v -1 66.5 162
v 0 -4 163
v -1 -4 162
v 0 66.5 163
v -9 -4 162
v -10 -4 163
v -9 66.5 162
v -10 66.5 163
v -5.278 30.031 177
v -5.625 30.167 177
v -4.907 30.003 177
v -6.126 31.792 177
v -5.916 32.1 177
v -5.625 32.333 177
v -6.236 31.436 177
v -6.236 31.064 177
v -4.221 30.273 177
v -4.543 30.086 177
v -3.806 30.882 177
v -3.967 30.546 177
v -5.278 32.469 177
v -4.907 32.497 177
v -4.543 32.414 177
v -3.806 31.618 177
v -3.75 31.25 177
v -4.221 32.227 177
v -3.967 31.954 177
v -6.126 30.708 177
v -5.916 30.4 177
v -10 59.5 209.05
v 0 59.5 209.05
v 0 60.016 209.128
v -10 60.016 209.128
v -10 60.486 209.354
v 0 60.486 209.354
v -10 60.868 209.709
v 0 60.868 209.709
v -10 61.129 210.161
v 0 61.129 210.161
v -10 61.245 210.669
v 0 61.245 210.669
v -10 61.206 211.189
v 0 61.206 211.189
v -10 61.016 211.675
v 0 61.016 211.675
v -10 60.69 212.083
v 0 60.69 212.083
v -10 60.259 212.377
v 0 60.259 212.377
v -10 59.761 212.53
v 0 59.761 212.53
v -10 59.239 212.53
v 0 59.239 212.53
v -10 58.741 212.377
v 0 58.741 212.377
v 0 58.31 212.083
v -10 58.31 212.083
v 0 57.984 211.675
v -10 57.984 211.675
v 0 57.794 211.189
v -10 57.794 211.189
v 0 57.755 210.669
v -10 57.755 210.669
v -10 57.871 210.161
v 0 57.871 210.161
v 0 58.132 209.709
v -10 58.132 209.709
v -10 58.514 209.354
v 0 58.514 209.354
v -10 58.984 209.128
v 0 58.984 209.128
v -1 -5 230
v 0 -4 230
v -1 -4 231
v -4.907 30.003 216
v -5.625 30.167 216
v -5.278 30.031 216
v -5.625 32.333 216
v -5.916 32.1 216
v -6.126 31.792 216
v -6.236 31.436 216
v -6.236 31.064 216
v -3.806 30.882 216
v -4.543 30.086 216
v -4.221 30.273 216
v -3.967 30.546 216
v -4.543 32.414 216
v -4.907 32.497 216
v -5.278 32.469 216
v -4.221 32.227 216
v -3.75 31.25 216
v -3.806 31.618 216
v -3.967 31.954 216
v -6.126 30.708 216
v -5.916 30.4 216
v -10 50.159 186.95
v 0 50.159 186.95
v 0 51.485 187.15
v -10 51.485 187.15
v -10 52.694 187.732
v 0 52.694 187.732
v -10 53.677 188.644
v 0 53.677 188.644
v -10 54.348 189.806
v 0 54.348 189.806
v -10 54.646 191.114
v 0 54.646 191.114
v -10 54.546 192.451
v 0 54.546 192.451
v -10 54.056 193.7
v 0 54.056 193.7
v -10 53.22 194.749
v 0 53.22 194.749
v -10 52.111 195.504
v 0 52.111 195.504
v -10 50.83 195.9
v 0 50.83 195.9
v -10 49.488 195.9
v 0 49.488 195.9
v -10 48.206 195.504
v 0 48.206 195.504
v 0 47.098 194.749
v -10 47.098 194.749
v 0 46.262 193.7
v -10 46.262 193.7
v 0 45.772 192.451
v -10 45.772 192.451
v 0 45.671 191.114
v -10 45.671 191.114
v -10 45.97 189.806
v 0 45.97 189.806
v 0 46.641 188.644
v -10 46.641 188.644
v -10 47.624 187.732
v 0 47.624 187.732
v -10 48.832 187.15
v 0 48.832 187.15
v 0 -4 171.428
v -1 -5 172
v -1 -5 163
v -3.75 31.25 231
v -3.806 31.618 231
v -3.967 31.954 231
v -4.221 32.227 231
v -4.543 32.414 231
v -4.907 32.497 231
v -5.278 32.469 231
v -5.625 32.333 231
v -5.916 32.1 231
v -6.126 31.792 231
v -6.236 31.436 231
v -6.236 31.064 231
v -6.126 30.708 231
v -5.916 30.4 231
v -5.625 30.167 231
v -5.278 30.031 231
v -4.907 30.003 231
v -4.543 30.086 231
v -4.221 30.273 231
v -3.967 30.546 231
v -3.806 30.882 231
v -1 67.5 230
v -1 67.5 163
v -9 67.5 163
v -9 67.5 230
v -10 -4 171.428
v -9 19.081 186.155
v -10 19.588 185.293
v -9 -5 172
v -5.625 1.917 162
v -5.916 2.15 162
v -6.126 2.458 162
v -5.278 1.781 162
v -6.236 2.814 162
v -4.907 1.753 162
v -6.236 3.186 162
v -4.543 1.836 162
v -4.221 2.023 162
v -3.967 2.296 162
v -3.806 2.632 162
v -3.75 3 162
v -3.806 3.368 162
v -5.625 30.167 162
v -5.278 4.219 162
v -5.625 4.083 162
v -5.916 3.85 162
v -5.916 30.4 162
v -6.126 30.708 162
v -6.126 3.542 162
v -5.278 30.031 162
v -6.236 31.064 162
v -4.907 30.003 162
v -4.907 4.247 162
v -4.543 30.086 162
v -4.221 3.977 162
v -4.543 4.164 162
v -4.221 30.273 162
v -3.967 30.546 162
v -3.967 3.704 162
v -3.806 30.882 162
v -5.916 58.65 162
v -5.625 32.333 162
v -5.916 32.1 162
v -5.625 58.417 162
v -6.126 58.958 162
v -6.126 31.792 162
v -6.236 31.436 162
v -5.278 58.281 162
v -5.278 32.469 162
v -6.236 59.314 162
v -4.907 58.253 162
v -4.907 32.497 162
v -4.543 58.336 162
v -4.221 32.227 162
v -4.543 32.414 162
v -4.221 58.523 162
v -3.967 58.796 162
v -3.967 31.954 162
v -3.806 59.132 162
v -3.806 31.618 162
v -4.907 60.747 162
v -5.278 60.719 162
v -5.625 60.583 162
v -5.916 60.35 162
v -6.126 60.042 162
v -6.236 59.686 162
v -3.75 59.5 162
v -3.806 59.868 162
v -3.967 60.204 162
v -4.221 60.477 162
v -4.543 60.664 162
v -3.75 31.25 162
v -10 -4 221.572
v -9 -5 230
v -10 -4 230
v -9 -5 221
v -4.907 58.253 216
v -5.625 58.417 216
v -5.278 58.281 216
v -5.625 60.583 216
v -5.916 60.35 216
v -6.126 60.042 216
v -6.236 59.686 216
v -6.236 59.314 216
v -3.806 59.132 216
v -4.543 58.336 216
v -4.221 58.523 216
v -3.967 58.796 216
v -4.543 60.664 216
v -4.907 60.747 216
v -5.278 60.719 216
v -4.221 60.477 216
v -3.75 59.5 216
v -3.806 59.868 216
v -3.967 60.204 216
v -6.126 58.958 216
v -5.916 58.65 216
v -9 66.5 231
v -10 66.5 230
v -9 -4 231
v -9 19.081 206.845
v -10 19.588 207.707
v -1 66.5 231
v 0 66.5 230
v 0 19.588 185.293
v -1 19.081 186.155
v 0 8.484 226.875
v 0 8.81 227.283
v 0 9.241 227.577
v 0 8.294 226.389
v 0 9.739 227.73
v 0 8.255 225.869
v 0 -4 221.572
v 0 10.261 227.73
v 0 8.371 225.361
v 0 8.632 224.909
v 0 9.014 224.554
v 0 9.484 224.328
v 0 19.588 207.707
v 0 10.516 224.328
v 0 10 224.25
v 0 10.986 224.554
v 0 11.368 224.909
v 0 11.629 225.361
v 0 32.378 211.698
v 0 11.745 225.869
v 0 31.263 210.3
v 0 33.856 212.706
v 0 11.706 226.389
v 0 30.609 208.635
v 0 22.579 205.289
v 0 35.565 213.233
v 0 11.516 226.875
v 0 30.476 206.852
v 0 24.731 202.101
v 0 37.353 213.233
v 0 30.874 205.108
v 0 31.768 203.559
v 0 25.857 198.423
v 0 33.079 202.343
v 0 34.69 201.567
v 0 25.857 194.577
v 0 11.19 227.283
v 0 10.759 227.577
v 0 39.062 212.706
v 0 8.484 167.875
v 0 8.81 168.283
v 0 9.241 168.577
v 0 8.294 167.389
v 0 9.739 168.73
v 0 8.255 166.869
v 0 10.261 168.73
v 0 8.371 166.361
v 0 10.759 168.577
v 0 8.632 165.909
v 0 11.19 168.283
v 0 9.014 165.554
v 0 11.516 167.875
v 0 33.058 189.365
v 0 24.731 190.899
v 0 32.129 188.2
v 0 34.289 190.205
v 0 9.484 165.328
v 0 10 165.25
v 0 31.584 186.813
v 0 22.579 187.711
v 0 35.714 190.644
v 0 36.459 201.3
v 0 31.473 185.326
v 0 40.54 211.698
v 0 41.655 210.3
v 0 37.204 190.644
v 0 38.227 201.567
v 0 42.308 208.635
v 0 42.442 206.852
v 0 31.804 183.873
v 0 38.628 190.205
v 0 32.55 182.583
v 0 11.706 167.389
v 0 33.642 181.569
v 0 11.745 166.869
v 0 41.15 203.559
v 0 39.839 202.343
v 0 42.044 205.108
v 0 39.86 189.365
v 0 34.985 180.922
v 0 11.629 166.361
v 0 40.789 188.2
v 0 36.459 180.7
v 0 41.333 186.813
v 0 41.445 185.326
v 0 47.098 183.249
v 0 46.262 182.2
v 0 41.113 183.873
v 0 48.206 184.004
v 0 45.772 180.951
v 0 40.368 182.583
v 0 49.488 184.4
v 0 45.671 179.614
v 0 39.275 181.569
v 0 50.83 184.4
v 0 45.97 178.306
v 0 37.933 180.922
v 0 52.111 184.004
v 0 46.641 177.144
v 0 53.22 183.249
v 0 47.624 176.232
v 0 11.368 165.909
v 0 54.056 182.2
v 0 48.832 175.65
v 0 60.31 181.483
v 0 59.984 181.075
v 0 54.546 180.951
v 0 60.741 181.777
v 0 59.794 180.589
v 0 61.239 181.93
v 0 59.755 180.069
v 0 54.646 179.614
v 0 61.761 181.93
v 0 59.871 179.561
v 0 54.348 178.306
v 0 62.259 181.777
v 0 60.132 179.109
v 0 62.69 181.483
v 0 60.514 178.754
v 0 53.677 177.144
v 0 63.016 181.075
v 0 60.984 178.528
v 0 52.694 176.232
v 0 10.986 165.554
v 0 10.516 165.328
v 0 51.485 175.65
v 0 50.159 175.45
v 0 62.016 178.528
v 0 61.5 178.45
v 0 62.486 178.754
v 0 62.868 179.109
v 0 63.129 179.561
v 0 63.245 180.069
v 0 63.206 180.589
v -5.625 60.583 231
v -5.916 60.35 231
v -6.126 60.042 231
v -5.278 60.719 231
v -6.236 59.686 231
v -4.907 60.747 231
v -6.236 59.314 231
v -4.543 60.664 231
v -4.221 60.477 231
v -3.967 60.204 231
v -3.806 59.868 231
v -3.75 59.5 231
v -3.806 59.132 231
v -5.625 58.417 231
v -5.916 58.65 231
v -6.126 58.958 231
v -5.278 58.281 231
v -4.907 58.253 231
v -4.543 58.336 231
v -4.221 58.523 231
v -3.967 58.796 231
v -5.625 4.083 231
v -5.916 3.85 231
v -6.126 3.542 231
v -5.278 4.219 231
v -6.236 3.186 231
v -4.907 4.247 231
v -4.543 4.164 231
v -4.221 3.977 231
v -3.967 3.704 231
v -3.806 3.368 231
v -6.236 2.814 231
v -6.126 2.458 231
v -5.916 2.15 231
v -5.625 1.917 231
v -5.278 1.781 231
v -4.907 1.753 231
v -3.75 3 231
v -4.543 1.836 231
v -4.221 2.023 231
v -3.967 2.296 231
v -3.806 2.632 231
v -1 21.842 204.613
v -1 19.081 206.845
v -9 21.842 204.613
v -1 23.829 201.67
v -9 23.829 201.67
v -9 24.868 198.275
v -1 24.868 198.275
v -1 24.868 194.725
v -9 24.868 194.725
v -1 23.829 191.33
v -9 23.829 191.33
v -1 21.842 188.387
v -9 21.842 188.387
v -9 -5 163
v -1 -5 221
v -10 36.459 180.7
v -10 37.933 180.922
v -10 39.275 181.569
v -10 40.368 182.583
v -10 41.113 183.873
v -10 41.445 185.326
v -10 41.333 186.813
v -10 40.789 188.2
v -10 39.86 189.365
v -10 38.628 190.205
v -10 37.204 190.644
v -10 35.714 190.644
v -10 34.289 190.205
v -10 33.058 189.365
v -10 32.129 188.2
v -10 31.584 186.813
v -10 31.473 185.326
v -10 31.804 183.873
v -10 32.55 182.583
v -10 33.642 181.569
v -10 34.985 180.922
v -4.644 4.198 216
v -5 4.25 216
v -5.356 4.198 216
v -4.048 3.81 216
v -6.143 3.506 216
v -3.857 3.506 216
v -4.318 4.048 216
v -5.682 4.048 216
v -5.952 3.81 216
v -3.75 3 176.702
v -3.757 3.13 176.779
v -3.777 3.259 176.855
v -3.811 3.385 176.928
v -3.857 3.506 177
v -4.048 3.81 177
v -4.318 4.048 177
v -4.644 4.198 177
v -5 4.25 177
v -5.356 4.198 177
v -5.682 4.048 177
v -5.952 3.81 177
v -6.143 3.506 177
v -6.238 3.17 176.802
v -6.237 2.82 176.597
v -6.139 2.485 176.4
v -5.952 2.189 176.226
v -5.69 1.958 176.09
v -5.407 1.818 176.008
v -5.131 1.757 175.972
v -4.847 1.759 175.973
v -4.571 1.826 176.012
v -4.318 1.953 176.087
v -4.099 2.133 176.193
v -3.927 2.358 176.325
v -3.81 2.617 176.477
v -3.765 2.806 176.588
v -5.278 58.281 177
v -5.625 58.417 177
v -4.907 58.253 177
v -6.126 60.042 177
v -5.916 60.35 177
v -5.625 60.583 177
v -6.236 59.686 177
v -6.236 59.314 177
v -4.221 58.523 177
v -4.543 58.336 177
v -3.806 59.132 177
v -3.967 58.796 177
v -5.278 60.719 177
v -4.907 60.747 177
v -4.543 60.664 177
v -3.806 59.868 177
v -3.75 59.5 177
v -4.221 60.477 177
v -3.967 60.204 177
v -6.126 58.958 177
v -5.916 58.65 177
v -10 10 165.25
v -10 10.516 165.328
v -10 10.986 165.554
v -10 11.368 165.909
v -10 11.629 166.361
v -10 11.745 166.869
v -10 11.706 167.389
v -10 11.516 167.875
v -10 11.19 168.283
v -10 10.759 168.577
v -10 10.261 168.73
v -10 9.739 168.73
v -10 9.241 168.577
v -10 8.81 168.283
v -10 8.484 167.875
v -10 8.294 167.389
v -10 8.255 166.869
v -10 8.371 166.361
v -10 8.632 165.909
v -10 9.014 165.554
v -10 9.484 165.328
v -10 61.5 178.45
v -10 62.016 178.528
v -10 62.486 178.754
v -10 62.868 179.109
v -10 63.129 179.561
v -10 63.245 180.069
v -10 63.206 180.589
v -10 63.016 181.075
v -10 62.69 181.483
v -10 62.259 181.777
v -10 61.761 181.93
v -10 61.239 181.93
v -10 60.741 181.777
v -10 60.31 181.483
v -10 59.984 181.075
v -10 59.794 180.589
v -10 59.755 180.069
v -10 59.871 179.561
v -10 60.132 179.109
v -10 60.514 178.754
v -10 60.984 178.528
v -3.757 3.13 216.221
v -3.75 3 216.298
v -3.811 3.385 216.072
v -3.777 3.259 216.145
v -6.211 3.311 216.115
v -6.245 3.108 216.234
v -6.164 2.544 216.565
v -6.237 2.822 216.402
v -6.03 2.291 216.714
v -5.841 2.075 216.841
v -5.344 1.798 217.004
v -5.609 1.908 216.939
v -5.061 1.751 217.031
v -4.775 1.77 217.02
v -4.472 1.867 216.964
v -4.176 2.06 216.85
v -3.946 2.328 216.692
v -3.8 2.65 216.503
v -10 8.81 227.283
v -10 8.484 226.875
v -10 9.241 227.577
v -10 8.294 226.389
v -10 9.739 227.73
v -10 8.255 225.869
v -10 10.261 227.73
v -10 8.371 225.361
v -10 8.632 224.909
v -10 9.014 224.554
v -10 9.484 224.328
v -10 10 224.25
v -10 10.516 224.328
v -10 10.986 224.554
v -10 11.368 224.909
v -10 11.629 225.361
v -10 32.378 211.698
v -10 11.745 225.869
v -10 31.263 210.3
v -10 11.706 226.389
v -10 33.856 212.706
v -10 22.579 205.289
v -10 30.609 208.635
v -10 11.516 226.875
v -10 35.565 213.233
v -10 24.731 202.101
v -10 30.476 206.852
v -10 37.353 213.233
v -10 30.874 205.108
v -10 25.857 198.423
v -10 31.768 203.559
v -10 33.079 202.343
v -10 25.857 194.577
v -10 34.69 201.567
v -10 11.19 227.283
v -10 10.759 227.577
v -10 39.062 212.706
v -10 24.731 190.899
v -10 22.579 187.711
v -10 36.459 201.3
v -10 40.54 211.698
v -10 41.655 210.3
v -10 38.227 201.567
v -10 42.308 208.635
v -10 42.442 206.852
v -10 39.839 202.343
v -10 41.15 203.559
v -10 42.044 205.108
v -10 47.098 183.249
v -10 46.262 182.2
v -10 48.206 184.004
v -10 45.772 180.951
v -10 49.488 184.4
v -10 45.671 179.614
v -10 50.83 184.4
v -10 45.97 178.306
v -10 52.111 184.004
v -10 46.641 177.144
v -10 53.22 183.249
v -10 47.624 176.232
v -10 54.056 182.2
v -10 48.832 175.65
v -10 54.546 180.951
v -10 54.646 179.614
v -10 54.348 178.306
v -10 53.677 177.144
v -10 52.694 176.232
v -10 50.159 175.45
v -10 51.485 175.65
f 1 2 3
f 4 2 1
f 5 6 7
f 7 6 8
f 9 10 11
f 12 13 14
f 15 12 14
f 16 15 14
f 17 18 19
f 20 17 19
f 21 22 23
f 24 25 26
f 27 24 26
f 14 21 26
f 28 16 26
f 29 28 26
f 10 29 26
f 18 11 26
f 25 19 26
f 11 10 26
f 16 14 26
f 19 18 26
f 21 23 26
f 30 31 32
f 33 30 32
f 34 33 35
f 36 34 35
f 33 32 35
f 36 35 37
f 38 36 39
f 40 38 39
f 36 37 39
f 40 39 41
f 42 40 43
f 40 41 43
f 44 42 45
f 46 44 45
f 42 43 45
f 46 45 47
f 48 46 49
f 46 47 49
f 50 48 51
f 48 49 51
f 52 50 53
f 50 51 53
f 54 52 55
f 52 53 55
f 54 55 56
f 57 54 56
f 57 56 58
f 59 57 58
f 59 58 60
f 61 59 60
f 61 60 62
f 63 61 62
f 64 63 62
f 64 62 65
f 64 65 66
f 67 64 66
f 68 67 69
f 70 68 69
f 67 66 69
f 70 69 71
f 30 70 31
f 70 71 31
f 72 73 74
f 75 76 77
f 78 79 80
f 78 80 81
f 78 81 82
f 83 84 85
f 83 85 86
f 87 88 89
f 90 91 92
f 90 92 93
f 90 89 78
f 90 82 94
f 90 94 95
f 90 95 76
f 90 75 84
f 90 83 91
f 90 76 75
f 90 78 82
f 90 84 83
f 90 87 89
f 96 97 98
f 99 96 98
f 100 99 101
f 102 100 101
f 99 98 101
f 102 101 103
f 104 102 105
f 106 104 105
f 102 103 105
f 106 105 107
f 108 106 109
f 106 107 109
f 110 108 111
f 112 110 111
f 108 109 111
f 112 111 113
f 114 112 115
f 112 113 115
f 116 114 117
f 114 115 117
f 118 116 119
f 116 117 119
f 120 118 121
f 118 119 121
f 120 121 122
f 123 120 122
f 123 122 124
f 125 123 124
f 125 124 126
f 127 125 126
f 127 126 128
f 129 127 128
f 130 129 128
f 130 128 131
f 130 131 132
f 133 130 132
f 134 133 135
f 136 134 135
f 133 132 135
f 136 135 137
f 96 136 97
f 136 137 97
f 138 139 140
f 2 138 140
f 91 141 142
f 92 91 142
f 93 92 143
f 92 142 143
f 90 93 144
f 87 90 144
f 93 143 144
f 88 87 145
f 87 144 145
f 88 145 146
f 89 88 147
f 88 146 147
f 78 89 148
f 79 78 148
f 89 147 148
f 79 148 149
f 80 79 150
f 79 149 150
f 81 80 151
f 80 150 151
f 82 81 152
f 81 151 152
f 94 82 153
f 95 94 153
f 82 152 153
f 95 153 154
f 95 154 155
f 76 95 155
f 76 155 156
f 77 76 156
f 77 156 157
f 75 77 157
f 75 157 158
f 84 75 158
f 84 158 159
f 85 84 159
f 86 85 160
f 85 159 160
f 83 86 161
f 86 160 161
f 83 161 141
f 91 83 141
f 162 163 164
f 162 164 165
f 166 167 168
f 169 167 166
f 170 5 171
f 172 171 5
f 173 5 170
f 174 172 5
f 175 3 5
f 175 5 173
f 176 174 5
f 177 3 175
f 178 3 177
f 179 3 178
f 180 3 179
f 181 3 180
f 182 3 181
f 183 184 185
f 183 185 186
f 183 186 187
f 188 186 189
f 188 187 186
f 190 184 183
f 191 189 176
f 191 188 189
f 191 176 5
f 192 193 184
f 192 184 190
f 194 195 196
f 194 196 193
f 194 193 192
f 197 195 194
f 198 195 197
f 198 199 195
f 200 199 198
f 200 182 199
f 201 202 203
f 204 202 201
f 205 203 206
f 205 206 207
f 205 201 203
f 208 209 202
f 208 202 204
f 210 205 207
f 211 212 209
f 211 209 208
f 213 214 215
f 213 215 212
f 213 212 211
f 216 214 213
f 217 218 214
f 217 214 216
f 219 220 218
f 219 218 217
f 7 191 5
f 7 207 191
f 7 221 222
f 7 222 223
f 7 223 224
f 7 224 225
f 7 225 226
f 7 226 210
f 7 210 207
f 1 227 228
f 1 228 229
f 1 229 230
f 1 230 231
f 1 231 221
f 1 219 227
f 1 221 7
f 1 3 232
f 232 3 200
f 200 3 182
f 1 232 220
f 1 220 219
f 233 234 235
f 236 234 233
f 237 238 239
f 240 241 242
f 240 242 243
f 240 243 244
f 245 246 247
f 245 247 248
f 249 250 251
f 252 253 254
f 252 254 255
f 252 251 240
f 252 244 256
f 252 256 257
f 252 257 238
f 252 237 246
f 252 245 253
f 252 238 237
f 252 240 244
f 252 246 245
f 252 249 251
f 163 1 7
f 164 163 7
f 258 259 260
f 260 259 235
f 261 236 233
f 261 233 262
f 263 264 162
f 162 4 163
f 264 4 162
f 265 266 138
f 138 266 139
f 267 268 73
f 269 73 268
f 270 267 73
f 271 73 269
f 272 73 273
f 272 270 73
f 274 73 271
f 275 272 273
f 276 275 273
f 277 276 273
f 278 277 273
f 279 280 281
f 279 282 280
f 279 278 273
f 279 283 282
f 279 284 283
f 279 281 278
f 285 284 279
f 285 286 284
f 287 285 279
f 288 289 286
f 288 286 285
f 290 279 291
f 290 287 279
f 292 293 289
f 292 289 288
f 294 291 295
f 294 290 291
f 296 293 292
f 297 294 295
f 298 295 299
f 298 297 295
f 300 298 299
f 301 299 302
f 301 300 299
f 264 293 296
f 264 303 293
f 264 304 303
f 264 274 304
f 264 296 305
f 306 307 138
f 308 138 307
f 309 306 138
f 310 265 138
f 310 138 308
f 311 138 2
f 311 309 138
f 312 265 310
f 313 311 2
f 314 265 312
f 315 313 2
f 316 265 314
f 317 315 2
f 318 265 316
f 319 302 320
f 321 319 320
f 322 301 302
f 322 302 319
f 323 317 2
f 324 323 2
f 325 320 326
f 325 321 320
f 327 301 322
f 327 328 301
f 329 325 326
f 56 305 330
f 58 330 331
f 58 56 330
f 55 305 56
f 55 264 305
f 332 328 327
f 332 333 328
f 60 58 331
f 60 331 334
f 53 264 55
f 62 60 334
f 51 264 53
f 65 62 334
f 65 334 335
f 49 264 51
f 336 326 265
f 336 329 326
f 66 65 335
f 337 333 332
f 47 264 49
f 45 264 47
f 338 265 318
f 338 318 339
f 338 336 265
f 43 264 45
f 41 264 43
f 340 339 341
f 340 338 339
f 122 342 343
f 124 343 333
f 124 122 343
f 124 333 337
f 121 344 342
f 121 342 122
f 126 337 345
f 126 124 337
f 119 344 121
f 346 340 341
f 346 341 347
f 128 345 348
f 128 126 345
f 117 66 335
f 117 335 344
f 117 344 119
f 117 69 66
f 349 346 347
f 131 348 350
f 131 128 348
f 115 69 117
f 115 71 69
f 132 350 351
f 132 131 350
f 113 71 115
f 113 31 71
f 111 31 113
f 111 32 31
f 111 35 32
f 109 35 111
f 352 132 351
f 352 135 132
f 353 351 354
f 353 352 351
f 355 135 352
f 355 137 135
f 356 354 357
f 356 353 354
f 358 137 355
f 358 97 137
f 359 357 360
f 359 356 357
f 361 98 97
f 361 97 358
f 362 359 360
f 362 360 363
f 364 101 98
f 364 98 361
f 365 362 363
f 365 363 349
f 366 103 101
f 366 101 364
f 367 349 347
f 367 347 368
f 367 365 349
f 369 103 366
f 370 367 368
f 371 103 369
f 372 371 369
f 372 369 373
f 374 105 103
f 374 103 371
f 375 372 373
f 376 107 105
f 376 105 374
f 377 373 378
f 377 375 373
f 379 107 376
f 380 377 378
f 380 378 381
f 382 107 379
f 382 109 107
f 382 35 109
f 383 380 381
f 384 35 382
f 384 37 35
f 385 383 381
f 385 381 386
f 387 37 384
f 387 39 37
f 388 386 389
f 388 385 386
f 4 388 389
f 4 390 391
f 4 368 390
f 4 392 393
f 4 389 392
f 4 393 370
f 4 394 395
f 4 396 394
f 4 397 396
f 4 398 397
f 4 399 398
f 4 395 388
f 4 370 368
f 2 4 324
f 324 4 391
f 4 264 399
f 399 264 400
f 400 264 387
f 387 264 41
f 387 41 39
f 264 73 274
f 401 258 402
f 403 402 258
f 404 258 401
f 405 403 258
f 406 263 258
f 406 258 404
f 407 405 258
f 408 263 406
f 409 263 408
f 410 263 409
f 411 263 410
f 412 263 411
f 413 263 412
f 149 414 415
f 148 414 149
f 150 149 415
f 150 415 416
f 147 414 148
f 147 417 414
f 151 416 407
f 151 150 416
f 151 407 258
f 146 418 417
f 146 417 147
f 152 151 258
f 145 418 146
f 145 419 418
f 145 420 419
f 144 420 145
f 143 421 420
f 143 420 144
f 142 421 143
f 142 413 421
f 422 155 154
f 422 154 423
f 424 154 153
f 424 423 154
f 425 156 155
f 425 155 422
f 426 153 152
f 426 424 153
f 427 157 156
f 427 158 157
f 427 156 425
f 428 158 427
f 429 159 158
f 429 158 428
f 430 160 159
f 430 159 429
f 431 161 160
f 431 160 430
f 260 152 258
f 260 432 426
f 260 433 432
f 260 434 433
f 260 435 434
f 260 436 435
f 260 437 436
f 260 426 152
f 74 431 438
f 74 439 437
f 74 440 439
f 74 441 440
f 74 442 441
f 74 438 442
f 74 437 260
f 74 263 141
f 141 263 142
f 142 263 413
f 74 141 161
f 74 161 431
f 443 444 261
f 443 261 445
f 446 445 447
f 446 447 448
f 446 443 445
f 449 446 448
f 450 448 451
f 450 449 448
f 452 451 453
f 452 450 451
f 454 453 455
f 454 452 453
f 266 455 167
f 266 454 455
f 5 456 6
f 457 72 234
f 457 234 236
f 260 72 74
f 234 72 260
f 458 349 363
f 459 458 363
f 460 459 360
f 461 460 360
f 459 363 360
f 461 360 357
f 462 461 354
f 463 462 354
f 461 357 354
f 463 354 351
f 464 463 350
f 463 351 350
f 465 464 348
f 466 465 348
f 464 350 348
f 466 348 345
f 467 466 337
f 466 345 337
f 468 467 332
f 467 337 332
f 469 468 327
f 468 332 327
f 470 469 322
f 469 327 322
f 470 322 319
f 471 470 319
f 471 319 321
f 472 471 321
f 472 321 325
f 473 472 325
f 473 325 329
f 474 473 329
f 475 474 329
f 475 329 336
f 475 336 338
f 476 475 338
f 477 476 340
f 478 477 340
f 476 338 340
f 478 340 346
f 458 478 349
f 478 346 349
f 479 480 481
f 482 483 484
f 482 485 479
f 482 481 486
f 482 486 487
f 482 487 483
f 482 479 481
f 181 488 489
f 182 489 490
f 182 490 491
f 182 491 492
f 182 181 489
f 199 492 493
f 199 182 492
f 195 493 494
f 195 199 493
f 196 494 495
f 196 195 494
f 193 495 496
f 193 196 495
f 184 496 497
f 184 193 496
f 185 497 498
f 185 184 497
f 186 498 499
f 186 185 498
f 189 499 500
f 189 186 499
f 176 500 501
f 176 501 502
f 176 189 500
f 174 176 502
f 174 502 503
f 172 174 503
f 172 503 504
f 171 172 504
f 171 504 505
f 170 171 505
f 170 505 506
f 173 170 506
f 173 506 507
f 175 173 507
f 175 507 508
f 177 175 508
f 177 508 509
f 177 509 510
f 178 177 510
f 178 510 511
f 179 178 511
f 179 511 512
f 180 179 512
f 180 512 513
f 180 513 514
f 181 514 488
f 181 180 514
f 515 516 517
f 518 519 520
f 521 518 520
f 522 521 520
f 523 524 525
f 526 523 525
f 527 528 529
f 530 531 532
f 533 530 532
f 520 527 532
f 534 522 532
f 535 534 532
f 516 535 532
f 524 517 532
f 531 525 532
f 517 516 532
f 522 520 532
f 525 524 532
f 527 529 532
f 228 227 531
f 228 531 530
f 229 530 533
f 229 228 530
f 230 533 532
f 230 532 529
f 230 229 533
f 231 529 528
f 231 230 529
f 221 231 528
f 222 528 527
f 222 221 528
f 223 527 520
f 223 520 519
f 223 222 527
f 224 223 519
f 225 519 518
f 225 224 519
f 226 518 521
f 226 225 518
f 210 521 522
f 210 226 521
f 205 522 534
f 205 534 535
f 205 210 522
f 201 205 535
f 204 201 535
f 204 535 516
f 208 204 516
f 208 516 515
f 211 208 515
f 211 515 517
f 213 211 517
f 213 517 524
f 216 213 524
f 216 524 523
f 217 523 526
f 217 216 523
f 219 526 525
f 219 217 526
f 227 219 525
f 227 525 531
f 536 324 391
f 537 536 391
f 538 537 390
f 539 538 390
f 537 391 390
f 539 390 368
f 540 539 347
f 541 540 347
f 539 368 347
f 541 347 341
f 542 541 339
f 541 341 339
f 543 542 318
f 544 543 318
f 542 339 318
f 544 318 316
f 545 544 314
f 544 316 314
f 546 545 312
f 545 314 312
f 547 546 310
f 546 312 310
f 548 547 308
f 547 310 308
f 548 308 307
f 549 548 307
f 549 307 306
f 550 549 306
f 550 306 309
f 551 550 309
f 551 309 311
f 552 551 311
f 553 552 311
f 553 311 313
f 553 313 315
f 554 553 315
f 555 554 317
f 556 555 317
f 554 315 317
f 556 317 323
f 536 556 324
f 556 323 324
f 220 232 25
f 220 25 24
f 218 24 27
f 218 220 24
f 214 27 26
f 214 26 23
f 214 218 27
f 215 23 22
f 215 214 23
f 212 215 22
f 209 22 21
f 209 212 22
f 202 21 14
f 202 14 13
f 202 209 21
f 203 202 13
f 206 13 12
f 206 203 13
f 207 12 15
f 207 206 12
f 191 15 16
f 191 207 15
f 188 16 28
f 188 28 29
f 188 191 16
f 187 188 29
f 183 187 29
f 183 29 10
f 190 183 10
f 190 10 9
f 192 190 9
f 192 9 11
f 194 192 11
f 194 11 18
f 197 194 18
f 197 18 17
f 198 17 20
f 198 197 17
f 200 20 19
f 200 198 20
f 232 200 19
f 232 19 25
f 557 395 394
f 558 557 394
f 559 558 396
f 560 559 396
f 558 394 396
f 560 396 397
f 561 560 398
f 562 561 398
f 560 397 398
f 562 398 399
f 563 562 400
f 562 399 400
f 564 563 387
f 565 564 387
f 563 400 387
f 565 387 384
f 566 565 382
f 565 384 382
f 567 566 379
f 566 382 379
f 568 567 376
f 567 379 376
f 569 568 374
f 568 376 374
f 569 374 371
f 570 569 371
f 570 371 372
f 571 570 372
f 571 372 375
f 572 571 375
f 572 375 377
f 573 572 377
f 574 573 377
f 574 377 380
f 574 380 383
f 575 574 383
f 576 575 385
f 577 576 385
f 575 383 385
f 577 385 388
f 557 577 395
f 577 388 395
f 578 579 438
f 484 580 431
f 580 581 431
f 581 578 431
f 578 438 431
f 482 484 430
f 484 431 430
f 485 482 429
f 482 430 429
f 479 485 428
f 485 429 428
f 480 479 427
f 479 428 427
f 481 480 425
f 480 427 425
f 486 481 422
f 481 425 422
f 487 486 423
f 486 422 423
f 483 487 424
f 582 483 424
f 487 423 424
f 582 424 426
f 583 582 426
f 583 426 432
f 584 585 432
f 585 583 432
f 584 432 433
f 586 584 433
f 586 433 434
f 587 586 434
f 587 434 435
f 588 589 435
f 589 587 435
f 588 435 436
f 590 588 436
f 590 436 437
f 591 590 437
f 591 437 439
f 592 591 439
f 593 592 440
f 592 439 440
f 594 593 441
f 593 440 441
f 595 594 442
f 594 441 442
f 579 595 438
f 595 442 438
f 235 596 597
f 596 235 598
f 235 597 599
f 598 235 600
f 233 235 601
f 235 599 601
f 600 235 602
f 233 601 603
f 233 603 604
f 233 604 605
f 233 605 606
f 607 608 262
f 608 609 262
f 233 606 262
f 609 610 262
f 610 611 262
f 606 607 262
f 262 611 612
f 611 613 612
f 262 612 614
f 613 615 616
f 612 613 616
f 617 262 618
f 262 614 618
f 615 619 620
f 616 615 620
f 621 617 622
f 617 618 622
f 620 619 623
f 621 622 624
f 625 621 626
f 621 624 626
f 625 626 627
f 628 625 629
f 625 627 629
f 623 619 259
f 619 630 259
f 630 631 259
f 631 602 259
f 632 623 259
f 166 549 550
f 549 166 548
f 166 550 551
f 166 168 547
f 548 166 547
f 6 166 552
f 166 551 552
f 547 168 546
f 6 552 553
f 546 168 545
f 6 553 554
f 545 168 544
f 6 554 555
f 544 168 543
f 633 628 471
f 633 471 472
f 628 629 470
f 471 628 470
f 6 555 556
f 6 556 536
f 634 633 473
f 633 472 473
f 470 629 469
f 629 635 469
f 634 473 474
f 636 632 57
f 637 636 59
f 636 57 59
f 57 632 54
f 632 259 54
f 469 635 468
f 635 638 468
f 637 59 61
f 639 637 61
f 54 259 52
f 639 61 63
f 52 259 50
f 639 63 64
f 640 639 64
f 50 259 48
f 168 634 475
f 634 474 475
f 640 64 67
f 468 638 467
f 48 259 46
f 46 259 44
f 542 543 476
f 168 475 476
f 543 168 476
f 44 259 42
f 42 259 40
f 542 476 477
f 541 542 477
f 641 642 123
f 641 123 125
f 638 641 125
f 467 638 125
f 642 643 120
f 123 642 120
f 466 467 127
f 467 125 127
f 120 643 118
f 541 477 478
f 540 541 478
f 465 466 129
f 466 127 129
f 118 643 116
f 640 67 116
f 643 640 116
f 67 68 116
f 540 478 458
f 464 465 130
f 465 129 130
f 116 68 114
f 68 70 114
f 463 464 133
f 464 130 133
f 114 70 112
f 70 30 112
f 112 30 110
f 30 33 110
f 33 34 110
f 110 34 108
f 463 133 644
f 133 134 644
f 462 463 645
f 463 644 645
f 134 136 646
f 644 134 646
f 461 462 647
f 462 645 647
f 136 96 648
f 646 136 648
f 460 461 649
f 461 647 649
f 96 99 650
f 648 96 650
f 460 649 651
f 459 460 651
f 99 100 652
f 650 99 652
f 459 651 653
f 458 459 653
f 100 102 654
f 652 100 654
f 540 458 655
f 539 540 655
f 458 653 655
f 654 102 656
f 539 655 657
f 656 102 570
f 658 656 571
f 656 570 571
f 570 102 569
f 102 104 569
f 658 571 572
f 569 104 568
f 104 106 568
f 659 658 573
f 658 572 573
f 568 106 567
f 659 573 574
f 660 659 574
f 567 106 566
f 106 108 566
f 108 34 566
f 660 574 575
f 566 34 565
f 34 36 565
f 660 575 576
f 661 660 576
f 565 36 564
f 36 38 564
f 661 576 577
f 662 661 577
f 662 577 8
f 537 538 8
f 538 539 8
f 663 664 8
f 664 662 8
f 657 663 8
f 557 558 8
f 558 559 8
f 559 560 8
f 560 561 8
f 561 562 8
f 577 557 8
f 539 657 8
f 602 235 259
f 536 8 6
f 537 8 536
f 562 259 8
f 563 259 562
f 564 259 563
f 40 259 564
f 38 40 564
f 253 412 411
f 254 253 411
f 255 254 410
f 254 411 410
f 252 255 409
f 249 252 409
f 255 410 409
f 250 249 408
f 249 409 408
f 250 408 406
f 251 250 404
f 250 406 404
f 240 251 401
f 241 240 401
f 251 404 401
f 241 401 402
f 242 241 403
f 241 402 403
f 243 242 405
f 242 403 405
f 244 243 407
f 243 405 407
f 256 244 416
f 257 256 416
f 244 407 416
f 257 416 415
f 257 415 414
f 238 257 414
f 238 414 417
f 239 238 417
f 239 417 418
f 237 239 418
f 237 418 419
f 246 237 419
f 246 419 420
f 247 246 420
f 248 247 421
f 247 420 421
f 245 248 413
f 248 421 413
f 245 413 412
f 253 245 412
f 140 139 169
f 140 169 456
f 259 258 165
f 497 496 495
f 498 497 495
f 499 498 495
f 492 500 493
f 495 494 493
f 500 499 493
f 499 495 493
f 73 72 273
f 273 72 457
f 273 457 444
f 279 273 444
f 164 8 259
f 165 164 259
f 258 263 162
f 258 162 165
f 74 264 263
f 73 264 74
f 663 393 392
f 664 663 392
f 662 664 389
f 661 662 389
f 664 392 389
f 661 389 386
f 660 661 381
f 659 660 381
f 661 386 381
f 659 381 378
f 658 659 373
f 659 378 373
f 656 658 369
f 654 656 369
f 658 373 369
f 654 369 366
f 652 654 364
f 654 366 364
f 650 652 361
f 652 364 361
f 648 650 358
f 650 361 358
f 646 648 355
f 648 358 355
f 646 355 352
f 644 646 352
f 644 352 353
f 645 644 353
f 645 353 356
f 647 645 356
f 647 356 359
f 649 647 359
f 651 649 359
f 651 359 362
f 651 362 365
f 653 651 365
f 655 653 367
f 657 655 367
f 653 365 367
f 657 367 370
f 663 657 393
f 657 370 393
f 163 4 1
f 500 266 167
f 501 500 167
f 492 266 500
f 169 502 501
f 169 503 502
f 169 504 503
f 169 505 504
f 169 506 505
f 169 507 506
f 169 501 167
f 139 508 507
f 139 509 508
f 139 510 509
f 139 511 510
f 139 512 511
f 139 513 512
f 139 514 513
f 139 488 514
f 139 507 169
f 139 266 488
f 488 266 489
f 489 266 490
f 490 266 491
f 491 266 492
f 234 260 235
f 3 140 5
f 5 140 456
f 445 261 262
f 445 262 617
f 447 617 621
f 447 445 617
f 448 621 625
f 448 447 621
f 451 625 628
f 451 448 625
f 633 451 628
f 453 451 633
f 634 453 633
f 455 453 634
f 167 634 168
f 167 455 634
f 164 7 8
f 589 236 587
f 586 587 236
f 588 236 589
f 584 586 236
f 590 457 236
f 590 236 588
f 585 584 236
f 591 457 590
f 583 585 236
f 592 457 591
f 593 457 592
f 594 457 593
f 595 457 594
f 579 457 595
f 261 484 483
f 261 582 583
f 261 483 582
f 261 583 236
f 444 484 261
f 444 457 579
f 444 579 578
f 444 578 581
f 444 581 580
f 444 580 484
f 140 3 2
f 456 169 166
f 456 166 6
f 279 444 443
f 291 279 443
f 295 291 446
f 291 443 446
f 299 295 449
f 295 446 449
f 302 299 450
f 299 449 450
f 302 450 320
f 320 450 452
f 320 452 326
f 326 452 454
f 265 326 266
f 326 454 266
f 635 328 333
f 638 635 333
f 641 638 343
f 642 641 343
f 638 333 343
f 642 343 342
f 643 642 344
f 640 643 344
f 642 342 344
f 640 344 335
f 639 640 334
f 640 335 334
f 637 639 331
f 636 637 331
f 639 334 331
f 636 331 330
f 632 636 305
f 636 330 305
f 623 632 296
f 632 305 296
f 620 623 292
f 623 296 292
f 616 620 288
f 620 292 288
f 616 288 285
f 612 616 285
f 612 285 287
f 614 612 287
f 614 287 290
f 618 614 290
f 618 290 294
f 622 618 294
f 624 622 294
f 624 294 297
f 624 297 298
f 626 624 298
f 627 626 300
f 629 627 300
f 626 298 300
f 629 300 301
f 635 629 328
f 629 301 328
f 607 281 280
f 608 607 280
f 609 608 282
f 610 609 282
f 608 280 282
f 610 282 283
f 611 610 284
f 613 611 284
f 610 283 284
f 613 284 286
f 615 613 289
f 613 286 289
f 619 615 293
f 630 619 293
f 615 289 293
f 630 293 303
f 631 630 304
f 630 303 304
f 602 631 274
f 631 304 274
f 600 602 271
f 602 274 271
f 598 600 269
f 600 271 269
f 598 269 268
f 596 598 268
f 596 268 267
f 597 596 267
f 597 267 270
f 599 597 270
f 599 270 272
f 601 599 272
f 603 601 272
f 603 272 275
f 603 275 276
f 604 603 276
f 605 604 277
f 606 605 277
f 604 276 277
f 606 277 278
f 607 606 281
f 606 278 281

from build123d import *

# Parameters (mm, degrees)
SKETCH4_R           = 1.75
SKETCH4_R_2         = 4.500000047
SKETCH4_R_3         = 5
SKETCH4_R_4         = 6
BOSS_EXTRUDE2_DEPTH = 10
SKETCH5_R           = 1.25
CUT_EXTRUDE2_DEPTH  = 15
CHAMFER1_SIZE       = 1


with BuildPart() as part:
    # Sketch4 → Boss-Extrude2 (new body)
    with BuildSketch(Plane(origin=(0, 0, 0), x_dir=(0, 0, -1), z_dir=(1, 0, 0))):
        with BuildLine():
            Line((-162.000000477, 67.500002682), (-231, 67.500002682))
            Line((-231, 67.500002682), (-231, -4.999999888))
            Line((-231, -4.999999888), (-220.999994636, -4.999999888))
            Line((-220.999994636, -4.999999888), (-206.845160655, 19.080913937))
            ThreePointArc((-206.845160655, 19.080913937), (-196.500000238, 24.999992792), (-186.154839822, 19.080913937))
            Line((-186.154839822, 19.080913937), (-172.000005841, -4.999999888))
            Line((-172.000005841, -4.999999888), (-162.000000477, -4.999999888))
            Line((-162.000000477, -4.999999888), (-162.000000477, 67.500002682))
        make_face()
        with Locations((-167.000003631, 10.000003689)):
            Circle(SKETCH4_R, mode=Mode.SUBTRACT)
        with Locations((-179.950002543, 50.158835948)):
            Circle(SKETCH4_R_2, mode=Mode.SUBTRACT)
        with Locations((-185.699998003, 36.458836819)):
            Circle(SKETCH4_R_3, mode=Mode.SUBTRACT)
        with Locations((-180.200001261, 61.499996666)):
            Circle(SKETCH4_R, mode=Mode.SUBTRACT)
        with Locations((-191.4500039, 50.158835948)):
            Circle(SKETCH4_R_2, mode=Mode.SUBTRACT)
        with Locations((-207.29999885, 36.458836819)):
            Circle(SKETCH4_R_4, mode=Mode.SUBTRACT)
        with Locations((-210.799998228, 59.499998412)):
            Circle(SKETCH4_R, mode=Mode.SUBTRACT)
        with Locations((-226, 10.000003689)):
            Circle(SKETCH4_R, mode=Mode.SUBTRACT)
    extrude(amount=-BOSS_EXTRUDE2_DEPTH)

    # Sketch5 → Cut-Extrude2 (cut)
    with BuildSketch(Plane.XY.offset(231)):
        with Locations((-5, 59.500002682)):
            Circle(SKETCH5_R)
        with Locations((-5, 31.250001397)):
            Circle(SKETCH5_R)
        with Locations((-5, 3.000002682)):
            Circle(SKETCH5_R)
    cut_extrude2 = extrude(amount=-CUT_EXTRUDE2_DEPTH, mode=Mode.SUBTRACT)

    # Mirror1: Cut-Extrude2 across plane
    add(cut_extrude2.mirror(Plane.XY.offset(196.500000238)), mode=Mode.SUBTRACT)

    # Chamfer1
    chamfer1_edges = [part.edges().sort_by_distance(p)[0] for p in [
        (0, -4.999999888, 225.999997318),
        (0, 31.250001397, 231),
        (0, 67.500002682, 196.500000238),
        (0, 31.250001397, 162.000000477),
        (-10, 31.250001397, 231),
        (-5, -4.999999888, 162.000000477),
        (-5, -4.999999888, 231),
        (-5, 67.500002682, 231),
        (-5, 67.500002682, 162.000000477),
        (-10, -4.999999888, 225.999997318),
        (-10, 7.040457024, 213.922577645),
        (-10, 24.999992792, 196.500000238),
        (-10, 7.040457024, 179.077422832),
        (-10, -4.999999888, 167.000003159),
        (-10, 31.250001397, 162.000000477),
        (0, -4.999999888, 167.000003159),
        (-10, 67.500002682, 196.500000238),
        (0, 7.040457024, 179.077422832),
        (0, 24.999992792, 196.500000238),
        (0, 7.040457024, 213.922577645),
    ]]
    chamfer(chamfer1_edges, length=CHAMFER1_SIZE)


solid = part.part
